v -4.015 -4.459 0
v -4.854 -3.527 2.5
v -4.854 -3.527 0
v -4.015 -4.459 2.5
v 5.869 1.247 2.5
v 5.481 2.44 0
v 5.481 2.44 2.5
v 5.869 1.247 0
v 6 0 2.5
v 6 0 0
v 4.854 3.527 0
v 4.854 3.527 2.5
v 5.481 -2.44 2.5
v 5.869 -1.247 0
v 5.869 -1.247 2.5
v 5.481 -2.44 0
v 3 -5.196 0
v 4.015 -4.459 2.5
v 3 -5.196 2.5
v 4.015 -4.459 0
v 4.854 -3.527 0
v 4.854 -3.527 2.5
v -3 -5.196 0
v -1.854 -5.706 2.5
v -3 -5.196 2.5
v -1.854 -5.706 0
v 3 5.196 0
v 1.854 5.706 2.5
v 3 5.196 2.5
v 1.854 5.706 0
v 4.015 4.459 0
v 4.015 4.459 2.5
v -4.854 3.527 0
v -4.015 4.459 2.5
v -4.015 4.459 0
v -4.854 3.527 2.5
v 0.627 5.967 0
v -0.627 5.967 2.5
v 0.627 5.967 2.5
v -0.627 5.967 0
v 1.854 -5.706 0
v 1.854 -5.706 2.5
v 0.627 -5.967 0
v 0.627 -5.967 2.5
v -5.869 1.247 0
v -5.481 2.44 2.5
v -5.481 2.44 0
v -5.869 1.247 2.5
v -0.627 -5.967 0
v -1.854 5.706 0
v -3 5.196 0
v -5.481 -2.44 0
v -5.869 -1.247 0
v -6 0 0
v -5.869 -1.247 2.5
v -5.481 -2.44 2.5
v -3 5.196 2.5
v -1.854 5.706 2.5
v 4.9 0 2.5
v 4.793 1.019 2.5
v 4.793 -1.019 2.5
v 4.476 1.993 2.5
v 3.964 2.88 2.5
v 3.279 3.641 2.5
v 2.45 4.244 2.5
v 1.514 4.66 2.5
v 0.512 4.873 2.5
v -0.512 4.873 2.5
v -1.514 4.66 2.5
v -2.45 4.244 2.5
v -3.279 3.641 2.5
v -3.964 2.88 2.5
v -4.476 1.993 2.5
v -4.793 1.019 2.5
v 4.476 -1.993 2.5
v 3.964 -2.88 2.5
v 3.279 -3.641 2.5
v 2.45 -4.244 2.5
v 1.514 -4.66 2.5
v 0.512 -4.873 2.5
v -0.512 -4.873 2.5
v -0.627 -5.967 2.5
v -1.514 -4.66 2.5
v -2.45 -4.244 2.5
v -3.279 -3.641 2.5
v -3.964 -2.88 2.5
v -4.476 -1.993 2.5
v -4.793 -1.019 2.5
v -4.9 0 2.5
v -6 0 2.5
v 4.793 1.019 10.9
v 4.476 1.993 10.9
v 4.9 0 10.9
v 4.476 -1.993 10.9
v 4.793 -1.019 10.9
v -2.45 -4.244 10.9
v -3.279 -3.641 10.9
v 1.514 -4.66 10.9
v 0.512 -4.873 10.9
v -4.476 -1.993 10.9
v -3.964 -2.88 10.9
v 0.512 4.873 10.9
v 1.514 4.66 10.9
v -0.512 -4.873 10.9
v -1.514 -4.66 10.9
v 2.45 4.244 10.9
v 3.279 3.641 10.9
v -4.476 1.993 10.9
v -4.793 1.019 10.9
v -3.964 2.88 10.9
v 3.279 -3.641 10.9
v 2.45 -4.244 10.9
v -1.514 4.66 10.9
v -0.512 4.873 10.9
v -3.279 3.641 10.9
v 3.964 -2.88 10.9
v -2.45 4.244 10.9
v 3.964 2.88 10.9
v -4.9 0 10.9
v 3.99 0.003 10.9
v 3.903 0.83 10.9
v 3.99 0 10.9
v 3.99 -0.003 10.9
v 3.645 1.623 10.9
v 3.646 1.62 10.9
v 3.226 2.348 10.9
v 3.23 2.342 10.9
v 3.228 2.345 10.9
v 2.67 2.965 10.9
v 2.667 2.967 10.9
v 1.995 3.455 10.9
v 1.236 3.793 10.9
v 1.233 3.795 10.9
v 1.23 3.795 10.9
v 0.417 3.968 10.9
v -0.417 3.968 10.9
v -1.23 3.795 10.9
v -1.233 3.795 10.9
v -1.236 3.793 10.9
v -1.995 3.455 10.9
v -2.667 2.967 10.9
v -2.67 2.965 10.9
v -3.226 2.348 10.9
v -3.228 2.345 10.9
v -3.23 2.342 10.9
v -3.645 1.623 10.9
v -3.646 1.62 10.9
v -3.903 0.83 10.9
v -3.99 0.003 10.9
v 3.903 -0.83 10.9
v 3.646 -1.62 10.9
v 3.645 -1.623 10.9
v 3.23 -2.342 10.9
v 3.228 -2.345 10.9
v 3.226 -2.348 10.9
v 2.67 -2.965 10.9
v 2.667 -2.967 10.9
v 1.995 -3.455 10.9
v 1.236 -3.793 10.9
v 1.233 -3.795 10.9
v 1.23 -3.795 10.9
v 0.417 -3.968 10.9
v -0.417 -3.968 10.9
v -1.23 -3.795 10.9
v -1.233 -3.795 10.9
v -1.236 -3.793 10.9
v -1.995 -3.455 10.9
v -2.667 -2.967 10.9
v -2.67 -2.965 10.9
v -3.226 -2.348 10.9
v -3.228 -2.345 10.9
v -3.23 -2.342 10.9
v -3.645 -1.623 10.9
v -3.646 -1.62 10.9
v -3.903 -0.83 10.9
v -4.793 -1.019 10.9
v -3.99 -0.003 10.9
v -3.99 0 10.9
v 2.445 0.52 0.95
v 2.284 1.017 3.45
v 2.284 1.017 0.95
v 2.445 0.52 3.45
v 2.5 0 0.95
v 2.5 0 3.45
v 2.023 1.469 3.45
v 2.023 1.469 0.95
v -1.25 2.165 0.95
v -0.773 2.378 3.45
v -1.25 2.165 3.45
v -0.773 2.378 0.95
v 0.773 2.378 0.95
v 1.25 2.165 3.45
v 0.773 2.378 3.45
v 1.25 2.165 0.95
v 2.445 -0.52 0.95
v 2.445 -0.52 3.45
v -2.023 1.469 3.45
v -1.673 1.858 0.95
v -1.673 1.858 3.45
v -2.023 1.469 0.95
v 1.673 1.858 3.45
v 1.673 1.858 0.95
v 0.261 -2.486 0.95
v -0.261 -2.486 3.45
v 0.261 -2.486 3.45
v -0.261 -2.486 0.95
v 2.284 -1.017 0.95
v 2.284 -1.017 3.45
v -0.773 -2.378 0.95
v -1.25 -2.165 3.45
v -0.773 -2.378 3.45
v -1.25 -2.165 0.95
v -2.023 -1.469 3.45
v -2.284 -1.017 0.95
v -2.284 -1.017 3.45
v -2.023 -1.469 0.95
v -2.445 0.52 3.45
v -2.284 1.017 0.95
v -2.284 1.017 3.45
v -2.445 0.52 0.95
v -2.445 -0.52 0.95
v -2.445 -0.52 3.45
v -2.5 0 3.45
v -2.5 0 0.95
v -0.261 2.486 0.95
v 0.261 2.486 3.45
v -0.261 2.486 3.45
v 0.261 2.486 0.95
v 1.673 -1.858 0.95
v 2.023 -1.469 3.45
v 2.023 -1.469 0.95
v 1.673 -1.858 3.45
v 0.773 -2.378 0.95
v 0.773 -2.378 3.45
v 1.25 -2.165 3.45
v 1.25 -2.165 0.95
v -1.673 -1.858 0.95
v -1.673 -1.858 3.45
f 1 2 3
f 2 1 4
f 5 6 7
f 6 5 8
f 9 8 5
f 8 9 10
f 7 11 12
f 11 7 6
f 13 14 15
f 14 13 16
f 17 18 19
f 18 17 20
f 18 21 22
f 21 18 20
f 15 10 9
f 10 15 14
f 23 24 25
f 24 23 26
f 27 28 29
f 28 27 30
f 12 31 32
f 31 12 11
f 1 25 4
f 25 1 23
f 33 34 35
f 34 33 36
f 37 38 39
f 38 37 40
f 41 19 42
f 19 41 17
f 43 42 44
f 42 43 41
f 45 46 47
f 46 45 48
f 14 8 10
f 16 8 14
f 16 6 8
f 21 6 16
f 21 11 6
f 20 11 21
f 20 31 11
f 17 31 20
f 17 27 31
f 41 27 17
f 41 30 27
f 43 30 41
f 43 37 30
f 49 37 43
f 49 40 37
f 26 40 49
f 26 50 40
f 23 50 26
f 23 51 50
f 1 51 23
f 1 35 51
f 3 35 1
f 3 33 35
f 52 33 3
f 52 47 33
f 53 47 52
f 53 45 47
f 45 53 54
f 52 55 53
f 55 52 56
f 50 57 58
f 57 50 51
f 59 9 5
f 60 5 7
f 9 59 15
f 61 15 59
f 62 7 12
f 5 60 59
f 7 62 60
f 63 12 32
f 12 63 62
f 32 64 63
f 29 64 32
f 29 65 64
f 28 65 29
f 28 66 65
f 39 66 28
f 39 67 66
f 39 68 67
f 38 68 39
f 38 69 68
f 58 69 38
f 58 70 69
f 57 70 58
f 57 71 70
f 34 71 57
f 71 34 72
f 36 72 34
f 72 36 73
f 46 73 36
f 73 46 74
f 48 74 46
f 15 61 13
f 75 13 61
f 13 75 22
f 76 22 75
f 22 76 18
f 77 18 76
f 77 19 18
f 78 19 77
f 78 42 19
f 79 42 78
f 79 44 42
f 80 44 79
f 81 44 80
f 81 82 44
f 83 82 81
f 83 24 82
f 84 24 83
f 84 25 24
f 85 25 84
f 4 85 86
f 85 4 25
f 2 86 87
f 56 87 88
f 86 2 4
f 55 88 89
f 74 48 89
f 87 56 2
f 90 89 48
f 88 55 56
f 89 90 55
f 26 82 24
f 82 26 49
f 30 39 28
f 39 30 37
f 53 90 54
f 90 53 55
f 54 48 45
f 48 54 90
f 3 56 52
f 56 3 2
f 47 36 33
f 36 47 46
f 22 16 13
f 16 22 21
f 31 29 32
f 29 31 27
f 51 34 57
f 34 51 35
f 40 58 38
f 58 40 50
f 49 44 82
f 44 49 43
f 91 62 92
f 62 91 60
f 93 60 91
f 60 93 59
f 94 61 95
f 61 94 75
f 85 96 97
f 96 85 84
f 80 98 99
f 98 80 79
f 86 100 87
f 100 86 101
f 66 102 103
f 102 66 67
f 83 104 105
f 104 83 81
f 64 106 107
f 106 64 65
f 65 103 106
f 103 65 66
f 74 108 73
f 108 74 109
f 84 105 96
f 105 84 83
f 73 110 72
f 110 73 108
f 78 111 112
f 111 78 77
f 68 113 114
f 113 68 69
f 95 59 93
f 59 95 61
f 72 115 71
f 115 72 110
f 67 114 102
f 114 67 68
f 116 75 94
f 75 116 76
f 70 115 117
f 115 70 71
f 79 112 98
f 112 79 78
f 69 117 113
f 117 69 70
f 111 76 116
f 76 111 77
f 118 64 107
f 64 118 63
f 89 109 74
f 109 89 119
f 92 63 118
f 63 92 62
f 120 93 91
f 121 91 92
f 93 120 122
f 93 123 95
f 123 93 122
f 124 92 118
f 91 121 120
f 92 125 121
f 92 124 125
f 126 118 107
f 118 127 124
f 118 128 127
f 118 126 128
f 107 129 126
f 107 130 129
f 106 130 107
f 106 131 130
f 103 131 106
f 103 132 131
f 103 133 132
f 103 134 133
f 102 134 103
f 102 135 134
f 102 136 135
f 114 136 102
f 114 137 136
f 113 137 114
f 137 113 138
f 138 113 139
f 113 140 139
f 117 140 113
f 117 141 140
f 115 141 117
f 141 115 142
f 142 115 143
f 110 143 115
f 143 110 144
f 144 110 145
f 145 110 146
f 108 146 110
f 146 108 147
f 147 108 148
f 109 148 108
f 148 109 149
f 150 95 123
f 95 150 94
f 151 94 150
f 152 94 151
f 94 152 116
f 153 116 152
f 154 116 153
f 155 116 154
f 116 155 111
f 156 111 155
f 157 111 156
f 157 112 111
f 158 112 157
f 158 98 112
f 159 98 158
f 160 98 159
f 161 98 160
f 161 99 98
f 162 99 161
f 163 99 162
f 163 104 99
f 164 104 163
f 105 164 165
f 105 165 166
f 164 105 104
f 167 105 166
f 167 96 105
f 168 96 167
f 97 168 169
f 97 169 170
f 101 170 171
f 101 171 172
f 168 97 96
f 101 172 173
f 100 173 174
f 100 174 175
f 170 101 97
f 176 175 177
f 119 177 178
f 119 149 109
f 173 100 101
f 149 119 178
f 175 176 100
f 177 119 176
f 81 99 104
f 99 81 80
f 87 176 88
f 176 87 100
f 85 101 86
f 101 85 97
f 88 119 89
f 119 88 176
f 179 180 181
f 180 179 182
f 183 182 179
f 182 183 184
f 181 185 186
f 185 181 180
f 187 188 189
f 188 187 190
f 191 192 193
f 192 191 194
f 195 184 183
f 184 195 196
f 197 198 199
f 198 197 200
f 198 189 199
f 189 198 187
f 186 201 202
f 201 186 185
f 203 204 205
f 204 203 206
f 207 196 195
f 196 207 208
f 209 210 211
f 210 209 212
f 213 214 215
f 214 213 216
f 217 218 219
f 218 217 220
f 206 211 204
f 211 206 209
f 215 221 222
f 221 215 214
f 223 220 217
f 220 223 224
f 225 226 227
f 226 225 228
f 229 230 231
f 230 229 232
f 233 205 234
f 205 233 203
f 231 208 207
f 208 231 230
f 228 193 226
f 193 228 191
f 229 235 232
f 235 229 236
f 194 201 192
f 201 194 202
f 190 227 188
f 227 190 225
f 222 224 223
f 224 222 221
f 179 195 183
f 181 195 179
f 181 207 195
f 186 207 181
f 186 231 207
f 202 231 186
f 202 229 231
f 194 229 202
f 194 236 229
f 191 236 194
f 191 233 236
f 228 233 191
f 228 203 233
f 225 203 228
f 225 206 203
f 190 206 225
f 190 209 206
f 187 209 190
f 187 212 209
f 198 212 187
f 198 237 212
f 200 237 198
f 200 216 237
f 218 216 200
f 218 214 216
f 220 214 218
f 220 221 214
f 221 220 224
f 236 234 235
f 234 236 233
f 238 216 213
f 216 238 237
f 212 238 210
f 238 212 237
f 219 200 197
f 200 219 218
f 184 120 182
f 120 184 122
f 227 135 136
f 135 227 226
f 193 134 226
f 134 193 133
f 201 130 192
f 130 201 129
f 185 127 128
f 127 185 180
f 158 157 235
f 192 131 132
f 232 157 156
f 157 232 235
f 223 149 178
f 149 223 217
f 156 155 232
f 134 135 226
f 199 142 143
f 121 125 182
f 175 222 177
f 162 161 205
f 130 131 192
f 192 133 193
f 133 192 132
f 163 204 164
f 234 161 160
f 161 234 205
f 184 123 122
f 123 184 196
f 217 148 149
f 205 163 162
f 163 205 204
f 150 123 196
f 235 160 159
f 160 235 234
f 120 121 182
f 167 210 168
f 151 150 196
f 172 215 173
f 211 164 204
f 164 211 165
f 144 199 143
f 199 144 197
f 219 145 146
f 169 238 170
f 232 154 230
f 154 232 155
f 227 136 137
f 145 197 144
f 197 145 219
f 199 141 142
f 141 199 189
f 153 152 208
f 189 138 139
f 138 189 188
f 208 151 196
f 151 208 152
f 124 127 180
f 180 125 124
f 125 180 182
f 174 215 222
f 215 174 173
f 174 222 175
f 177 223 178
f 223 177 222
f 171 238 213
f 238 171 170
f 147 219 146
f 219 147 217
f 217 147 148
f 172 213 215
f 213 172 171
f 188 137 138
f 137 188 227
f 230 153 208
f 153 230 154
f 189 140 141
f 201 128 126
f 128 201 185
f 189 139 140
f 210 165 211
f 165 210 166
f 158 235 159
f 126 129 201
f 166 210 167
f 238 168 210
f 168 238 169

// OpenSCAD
// [FL_INDEX: keywords="openscad, 3d_parametric, Squeeze_Bottle_Cap__Parametric, csg_solid" | COT="Parametric OpenSCAD design from 3DCodeverse"]
// Title: Squeeze Bottle Cap (Parametric) 

/*
 * Squeeze Bottle Cap
 *
 * by Alex Franke (CodeCreations), Nov 2012
 * http://www.theFrankes.com
 * 
 * Licenced under Creative Commons Attribution - Non-Commercial - Share Alike 3.0 
 * 
 * INSTRUCTIONS: Choose some values in the "User-defined values" section, render, and print. 
 * 
 * v1.00, Nov 21, 2012: Initial Release.
 *
 * TODO: 
 *   * Nothing at this time. 
 */

/////////////////////////////////////////////////////////////////////////////
// User-defined values... 
/////////////////////////////////////////////////////////////////////////////

lowerInnerDiameter   = 8;    // Larger diameter of cone-shaped nozzle (farthest from the tip)
lowerDiameterHeight  = 10;   // Distance from tip of previous measurement  (also insertion depth)

upperInnerDiameter   = 5;    // Smaller diameter of cone-shaped nozzle (near the tip)
upperDiameterHeight  = 2.5;  // Distance from tip of previous measurement 

capDiameter          = 12;   // Diameter of ridge at top of cap
capHeight            = 2.5;  // Height of ridge at top of cap
materialThickness    = 0.9;  // Minimum thickness of printed material

$fn                  = 30;   // Curve quality 


/////////////////////////////////////////////////////////////////////////////
// The code... 
/////////////////////////////////////////////////////////////////////////////

squeezeBottleCap(); 

/////////////////////////////////////////////////////////////////////////////
// Modules... 
/////////////////////////////////////////////////////////////////////////////

module squeezeBottleCap() {

	difference() {
		union() {
			cylinder(h=capHeight, r=capDiameter/2);
			translate([0,0,materialThickness]) 
				cylinder(h=lowerDiameterHeight, r=lowerInnerDiameter/2+materialThickness);
		}
	
		translate([0,0,materialThickness+0.05]) 
		union() {
			cylinder(r=upperInnerDiameter/2, h=upperDiameterHeight);
			translate([0,0,upperDiameterHeight]) 
				cylinder(r1=upperInnerDiameter/2, r2=lowerInnerDiameter/2, h=lowerDiameterHeight-upperDiameterHeight);
		}
	}
}
